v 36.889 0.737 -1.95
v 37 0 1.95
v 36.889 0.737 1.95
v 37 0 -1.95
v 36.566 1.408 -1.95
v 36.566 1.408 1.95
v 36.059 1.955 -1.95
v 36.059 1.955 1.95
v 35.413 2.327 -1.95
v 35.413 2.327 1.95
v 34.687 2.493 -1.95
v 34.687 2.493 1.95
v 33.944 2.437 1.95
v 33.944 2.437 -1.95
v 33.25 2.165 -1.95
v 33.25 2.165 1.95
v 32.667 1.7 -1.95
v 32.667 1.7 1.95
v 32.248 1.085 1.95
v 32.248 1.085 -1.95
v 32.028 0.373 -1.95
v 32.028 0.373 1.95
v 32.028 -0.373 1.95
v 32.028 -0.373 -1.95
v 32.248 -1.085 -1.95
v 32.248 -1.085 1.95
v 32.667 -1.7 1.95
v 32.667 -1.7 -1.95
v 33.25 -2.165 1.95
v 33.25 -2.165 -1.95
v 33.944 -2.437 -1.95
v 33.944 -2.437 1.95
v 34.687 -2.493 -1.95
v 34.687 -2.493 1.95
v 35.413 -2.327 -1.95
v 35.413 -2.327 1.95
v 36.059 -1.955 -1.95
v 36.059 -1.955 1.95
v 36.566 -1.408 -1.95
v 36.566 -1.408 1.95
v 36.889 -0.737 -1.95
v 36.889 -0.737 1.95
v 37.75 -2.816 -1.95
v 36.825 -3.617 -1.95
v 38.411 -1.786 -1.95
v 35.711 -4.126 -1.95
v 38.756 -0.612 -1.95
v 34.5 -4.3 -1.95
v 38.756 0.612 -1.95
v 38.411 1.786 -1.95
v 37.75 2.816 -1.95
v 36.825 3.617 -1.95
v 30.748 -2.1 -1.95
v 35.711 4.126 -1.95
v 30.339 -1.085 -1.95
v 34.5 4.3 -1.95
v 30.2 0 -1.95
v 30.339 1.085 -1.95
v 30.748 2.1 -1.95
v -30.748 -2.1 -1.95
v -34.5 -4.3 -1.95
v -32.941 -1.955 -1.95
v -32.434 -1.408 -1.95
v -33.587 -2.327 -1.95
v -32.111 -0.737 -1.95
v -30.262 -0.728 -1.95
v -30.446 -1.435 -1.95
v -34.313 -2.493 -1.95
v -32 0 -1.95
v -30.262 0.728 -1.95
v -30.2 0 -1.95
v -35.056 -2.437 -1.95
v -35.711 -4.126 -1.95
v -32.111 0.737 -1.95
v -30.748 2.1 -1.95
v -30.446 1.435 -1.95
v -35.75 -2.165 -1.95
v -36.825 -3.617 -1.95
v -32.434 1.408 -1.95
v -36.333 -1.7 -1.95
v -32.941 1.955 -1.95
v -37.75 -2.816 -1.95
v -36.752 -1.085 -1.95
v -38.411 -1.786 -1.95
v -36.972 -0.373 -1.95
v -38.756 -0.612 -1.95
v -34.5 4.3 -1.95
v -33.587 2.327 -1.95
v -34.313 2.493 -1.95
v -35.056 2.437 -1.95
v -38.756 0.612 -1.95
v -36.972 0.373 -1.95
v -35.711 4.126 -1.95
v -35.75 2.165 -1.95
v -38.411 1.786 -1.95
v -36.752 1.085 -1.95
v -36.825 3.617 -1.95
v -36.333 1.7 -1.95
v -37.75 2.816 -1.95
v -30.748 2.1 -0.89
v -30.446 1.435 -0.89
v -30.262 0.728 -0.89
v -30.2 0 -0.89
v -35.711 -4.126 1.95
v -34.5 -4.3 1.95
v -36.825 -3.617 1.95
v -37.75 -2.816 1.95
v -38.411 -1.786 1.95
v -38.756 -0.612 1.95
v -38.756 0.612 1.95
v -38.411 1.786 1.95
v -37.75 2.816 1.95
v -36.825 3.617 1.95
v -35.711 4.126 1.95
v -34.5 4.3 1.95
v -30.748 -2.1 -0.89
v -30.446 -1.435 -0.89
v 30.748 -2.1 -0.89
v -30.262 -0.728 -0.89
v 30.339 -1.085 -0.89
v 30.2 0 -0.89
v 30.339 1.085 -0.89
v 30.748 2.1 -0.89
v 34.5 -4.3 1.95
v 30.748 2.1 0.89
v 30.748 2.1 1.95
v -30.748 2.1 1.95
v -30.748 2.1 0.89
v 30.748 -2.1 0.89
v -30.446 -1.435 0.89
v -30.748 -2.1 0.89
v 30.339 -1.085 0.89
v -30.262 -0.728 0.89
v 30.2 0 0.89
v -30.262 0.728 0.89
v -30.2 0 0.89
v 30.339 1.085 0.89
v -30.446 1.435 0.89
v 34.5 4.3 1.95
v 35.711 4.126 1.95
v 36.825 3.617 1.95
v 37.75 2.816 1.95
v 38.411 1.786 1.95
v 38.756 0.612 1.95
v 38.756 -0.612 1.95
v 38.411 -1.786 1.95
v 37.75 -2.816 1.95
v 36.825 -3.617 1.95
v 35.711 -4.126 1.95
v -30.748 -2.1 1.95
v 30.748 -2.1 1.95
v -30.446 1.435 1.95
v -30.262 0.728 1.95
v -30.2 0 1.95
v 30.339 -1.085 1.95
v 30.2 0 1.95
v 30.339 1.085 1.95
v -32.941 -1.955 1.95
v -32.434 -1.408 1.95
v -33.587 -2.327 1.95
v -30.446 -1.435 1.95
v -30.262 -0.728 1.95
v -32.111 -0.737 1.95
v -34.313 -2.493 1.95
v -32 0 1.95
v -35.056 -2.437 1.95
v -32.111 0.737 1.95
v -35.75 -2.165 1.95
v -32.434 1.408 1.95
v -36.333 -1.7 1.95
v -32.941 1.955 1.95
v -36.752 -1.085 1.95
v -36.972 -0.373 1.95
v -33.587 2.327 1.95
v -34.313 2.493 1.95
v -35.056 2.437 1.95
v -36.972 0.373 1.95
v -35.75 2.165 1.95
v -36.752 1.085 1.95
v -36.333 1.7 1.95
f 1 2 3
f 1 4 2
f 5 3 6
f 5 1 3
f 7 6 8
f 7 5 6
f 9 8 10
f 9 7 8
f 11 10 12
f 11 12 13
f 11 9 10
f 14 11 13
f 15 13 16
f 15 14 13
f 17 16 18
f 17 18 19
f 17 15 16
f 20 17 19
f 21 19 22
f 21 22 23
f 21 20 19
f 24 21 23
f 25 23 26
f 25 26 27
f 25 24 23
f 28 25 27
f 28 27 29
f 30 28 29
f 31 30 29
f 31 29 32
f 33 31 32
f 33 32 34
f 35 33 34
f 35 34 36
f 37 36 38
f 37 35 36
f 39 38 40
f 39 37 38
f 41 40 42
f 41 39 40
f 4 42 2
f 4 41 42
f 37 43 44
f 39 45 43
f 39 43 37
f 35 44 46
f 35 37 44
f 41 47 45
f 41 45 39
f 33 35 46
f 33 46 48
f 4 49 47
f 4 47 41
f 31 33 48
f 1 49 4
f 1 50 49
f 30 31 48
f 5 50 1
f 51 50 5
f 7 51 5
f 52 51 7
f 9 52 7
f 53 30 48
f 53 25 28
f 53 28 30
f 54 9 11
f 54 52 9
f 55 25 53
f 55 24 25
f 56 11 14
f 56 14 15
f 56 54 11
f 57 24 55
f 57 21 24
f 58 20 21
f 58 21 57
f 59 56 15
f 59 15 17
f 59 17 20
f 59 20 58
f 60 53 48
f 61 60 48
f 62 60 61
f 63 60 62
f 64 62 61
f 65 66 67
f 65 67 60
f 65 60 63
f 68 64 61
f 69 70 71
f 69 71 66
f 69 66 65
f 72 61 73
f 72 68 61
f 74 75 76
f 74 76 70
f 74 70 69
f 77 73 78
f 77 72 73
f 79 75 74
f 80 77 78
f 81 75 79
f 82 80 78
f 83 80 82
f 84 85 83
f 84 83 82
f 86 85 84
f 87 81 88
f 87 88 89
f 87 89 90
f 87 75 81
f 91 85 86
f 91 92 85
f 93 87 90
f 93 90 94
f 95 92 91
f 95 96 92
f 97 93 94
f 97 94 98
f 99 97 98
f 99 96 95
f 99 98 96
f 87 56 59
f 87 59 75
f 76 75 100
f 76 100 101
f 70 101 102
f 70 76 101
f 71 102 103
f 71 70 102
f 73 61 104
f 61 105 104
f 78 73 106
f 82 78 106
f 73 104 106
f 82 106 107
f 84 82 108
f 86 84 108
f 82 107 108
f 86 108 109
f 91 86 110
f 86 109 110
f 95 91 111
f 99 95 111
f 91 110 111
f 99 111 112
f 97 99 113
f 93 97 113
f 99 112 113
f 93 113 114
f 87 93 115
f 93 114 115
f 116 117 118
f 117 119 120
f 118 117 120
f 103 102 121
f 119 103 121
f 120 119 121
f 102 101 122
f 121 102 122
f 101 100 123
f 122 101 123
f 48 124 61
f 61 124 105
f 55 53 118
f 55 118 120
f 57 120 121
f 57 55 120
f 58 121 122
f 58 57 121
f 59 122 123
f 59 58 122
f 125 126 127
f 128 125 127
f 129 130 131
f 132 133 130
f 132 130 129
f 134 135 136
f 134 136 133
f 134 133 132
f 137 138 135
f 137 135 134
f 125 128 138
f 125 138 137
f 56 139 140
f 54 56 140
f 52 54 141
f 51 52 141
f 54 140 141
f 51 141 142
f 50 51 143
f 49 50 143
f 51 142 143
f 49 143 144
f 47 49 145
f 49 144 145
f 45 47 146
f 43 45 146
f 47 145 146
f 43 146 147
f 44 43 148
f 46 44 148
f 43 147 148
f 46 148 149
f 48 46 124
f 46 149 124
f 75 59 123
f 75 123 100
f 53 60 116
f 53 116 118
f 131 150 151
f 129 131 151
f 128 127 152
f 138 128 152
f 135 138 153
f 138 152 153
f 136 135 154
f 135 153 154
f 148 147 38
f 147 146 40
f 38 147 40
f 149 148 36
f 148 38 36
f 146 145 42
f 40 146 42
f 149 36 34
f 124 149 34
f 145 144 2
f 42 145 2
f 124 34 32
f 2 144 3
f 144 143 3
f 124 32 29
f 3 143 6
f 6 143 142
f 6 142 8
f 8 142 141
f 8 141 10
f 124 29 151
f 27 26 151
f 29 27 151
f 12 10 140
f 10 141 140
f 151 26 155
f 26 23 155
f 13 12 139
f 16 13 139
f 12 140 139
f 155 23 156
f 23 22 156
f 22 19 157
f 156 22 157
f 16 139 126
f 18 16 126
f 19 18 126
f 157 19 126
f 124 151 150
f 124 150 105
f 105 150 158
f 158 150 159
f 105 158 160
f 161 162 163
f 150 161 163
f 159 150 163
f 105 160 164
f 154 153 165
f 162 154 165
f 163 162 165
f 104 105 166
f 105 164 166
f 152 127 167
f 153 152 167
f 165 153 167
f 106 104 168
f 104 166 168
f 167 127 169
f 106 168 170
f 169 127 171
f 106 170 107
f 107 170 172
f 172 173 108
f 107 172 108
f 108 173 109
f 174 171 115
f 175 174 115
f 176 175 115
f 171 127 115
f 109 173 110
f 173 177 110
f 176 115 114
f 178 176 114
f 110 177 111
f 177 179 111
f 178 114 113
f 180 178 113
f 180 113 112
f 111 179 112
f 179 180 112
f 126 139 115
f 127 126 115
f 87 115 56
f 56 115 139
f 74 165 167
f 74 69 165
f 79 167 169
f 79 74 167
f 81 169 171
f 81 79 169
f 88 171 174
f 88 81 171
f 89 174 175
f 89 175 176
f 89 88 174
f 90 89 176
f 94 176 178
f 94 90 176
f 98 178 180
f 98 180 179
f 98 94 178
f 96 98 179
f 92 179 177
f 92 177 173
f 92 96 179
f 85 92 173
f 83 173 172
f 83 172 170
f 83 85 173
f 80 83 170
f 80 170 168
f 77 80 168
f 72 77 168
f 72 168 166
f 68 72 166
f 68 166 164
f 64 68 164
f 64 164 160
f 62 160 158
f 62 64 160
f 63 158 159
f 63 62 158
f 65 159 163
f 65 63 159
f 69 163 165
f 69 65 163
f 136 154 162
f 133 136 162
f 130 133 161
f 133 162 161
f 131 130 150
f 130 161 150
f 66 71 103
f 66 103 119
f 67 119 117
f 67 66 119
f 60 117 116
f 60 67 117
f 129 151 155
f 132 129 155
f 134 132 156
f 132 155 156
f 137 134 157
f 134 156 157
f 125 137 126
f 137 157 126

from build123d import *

# Parameters (mm, degrees)
SKETCH1_R           = 2.5
BOSS_EXTRUDE1_DEPTH = 1.95
CUT_EXTRUDE1_DEPTH  = 1.06


with BuildPart() as part:
    # Sketch1 → Boss-Extrude1 (new, symmetric)
    with BuildSketch(Plane.XY):
        with BuildLine():
            Line((34.5, -4.3), (-34.5, -4.3))
            ThreePointArc((-34.5, -4.3), (-38.8, 0), (-34.5, 4.3))
            Line((-34.5, 4.3), (34.5, 4.3))
            ThreePointArc((34.5, 4.3), (38.8, 0), (34.5, -4.3))
        make_face()
        with Locations((-34.5, 0)):
            Circle(SKETCH1_R, mode=Mode.SUBTRACT)
        with Locations((34.5, 0)):
            Circle(SKETCH1_R, mode=Mode.SUBTRACT)
    extrude(amount=BOSS_EXTRUDE1_DEPTH, both=True)

    # Sketch2 → Cut-Extrude1 (cut)
    with BuildSketch(Plane.XY.offset(1.95)):
        with BuildLine():
            ThreePointArc((30.747667392, -2.1), (30.2, 0), (30.747667392, 2.1))
            Line((30.747667392, 2.1), (-30.747667392, 2.1))
            ThreePointArc((-30.747667392, 2.1), (-30.33916894, 1.08511976), (-30.2, 0))
            ThreePointArc((-30.2, 0), (-30.33916894, -1.08511976), (-30.747667392, -2.1))
            Line((-30.747667392, -2.1), (30.747667392, -2.1))
        make_face()
    cut_extrude1 = extrude(amount=-CUT_EXTRUDE1_DEPTH, mode=Mode.SUBTRACT)

    # Mirror1: Cut-Extrude1 across plane
    add(cut_extrude1.mirror(Plane.XY), mode=Mode.SUBTRACT)


solid = part.part
